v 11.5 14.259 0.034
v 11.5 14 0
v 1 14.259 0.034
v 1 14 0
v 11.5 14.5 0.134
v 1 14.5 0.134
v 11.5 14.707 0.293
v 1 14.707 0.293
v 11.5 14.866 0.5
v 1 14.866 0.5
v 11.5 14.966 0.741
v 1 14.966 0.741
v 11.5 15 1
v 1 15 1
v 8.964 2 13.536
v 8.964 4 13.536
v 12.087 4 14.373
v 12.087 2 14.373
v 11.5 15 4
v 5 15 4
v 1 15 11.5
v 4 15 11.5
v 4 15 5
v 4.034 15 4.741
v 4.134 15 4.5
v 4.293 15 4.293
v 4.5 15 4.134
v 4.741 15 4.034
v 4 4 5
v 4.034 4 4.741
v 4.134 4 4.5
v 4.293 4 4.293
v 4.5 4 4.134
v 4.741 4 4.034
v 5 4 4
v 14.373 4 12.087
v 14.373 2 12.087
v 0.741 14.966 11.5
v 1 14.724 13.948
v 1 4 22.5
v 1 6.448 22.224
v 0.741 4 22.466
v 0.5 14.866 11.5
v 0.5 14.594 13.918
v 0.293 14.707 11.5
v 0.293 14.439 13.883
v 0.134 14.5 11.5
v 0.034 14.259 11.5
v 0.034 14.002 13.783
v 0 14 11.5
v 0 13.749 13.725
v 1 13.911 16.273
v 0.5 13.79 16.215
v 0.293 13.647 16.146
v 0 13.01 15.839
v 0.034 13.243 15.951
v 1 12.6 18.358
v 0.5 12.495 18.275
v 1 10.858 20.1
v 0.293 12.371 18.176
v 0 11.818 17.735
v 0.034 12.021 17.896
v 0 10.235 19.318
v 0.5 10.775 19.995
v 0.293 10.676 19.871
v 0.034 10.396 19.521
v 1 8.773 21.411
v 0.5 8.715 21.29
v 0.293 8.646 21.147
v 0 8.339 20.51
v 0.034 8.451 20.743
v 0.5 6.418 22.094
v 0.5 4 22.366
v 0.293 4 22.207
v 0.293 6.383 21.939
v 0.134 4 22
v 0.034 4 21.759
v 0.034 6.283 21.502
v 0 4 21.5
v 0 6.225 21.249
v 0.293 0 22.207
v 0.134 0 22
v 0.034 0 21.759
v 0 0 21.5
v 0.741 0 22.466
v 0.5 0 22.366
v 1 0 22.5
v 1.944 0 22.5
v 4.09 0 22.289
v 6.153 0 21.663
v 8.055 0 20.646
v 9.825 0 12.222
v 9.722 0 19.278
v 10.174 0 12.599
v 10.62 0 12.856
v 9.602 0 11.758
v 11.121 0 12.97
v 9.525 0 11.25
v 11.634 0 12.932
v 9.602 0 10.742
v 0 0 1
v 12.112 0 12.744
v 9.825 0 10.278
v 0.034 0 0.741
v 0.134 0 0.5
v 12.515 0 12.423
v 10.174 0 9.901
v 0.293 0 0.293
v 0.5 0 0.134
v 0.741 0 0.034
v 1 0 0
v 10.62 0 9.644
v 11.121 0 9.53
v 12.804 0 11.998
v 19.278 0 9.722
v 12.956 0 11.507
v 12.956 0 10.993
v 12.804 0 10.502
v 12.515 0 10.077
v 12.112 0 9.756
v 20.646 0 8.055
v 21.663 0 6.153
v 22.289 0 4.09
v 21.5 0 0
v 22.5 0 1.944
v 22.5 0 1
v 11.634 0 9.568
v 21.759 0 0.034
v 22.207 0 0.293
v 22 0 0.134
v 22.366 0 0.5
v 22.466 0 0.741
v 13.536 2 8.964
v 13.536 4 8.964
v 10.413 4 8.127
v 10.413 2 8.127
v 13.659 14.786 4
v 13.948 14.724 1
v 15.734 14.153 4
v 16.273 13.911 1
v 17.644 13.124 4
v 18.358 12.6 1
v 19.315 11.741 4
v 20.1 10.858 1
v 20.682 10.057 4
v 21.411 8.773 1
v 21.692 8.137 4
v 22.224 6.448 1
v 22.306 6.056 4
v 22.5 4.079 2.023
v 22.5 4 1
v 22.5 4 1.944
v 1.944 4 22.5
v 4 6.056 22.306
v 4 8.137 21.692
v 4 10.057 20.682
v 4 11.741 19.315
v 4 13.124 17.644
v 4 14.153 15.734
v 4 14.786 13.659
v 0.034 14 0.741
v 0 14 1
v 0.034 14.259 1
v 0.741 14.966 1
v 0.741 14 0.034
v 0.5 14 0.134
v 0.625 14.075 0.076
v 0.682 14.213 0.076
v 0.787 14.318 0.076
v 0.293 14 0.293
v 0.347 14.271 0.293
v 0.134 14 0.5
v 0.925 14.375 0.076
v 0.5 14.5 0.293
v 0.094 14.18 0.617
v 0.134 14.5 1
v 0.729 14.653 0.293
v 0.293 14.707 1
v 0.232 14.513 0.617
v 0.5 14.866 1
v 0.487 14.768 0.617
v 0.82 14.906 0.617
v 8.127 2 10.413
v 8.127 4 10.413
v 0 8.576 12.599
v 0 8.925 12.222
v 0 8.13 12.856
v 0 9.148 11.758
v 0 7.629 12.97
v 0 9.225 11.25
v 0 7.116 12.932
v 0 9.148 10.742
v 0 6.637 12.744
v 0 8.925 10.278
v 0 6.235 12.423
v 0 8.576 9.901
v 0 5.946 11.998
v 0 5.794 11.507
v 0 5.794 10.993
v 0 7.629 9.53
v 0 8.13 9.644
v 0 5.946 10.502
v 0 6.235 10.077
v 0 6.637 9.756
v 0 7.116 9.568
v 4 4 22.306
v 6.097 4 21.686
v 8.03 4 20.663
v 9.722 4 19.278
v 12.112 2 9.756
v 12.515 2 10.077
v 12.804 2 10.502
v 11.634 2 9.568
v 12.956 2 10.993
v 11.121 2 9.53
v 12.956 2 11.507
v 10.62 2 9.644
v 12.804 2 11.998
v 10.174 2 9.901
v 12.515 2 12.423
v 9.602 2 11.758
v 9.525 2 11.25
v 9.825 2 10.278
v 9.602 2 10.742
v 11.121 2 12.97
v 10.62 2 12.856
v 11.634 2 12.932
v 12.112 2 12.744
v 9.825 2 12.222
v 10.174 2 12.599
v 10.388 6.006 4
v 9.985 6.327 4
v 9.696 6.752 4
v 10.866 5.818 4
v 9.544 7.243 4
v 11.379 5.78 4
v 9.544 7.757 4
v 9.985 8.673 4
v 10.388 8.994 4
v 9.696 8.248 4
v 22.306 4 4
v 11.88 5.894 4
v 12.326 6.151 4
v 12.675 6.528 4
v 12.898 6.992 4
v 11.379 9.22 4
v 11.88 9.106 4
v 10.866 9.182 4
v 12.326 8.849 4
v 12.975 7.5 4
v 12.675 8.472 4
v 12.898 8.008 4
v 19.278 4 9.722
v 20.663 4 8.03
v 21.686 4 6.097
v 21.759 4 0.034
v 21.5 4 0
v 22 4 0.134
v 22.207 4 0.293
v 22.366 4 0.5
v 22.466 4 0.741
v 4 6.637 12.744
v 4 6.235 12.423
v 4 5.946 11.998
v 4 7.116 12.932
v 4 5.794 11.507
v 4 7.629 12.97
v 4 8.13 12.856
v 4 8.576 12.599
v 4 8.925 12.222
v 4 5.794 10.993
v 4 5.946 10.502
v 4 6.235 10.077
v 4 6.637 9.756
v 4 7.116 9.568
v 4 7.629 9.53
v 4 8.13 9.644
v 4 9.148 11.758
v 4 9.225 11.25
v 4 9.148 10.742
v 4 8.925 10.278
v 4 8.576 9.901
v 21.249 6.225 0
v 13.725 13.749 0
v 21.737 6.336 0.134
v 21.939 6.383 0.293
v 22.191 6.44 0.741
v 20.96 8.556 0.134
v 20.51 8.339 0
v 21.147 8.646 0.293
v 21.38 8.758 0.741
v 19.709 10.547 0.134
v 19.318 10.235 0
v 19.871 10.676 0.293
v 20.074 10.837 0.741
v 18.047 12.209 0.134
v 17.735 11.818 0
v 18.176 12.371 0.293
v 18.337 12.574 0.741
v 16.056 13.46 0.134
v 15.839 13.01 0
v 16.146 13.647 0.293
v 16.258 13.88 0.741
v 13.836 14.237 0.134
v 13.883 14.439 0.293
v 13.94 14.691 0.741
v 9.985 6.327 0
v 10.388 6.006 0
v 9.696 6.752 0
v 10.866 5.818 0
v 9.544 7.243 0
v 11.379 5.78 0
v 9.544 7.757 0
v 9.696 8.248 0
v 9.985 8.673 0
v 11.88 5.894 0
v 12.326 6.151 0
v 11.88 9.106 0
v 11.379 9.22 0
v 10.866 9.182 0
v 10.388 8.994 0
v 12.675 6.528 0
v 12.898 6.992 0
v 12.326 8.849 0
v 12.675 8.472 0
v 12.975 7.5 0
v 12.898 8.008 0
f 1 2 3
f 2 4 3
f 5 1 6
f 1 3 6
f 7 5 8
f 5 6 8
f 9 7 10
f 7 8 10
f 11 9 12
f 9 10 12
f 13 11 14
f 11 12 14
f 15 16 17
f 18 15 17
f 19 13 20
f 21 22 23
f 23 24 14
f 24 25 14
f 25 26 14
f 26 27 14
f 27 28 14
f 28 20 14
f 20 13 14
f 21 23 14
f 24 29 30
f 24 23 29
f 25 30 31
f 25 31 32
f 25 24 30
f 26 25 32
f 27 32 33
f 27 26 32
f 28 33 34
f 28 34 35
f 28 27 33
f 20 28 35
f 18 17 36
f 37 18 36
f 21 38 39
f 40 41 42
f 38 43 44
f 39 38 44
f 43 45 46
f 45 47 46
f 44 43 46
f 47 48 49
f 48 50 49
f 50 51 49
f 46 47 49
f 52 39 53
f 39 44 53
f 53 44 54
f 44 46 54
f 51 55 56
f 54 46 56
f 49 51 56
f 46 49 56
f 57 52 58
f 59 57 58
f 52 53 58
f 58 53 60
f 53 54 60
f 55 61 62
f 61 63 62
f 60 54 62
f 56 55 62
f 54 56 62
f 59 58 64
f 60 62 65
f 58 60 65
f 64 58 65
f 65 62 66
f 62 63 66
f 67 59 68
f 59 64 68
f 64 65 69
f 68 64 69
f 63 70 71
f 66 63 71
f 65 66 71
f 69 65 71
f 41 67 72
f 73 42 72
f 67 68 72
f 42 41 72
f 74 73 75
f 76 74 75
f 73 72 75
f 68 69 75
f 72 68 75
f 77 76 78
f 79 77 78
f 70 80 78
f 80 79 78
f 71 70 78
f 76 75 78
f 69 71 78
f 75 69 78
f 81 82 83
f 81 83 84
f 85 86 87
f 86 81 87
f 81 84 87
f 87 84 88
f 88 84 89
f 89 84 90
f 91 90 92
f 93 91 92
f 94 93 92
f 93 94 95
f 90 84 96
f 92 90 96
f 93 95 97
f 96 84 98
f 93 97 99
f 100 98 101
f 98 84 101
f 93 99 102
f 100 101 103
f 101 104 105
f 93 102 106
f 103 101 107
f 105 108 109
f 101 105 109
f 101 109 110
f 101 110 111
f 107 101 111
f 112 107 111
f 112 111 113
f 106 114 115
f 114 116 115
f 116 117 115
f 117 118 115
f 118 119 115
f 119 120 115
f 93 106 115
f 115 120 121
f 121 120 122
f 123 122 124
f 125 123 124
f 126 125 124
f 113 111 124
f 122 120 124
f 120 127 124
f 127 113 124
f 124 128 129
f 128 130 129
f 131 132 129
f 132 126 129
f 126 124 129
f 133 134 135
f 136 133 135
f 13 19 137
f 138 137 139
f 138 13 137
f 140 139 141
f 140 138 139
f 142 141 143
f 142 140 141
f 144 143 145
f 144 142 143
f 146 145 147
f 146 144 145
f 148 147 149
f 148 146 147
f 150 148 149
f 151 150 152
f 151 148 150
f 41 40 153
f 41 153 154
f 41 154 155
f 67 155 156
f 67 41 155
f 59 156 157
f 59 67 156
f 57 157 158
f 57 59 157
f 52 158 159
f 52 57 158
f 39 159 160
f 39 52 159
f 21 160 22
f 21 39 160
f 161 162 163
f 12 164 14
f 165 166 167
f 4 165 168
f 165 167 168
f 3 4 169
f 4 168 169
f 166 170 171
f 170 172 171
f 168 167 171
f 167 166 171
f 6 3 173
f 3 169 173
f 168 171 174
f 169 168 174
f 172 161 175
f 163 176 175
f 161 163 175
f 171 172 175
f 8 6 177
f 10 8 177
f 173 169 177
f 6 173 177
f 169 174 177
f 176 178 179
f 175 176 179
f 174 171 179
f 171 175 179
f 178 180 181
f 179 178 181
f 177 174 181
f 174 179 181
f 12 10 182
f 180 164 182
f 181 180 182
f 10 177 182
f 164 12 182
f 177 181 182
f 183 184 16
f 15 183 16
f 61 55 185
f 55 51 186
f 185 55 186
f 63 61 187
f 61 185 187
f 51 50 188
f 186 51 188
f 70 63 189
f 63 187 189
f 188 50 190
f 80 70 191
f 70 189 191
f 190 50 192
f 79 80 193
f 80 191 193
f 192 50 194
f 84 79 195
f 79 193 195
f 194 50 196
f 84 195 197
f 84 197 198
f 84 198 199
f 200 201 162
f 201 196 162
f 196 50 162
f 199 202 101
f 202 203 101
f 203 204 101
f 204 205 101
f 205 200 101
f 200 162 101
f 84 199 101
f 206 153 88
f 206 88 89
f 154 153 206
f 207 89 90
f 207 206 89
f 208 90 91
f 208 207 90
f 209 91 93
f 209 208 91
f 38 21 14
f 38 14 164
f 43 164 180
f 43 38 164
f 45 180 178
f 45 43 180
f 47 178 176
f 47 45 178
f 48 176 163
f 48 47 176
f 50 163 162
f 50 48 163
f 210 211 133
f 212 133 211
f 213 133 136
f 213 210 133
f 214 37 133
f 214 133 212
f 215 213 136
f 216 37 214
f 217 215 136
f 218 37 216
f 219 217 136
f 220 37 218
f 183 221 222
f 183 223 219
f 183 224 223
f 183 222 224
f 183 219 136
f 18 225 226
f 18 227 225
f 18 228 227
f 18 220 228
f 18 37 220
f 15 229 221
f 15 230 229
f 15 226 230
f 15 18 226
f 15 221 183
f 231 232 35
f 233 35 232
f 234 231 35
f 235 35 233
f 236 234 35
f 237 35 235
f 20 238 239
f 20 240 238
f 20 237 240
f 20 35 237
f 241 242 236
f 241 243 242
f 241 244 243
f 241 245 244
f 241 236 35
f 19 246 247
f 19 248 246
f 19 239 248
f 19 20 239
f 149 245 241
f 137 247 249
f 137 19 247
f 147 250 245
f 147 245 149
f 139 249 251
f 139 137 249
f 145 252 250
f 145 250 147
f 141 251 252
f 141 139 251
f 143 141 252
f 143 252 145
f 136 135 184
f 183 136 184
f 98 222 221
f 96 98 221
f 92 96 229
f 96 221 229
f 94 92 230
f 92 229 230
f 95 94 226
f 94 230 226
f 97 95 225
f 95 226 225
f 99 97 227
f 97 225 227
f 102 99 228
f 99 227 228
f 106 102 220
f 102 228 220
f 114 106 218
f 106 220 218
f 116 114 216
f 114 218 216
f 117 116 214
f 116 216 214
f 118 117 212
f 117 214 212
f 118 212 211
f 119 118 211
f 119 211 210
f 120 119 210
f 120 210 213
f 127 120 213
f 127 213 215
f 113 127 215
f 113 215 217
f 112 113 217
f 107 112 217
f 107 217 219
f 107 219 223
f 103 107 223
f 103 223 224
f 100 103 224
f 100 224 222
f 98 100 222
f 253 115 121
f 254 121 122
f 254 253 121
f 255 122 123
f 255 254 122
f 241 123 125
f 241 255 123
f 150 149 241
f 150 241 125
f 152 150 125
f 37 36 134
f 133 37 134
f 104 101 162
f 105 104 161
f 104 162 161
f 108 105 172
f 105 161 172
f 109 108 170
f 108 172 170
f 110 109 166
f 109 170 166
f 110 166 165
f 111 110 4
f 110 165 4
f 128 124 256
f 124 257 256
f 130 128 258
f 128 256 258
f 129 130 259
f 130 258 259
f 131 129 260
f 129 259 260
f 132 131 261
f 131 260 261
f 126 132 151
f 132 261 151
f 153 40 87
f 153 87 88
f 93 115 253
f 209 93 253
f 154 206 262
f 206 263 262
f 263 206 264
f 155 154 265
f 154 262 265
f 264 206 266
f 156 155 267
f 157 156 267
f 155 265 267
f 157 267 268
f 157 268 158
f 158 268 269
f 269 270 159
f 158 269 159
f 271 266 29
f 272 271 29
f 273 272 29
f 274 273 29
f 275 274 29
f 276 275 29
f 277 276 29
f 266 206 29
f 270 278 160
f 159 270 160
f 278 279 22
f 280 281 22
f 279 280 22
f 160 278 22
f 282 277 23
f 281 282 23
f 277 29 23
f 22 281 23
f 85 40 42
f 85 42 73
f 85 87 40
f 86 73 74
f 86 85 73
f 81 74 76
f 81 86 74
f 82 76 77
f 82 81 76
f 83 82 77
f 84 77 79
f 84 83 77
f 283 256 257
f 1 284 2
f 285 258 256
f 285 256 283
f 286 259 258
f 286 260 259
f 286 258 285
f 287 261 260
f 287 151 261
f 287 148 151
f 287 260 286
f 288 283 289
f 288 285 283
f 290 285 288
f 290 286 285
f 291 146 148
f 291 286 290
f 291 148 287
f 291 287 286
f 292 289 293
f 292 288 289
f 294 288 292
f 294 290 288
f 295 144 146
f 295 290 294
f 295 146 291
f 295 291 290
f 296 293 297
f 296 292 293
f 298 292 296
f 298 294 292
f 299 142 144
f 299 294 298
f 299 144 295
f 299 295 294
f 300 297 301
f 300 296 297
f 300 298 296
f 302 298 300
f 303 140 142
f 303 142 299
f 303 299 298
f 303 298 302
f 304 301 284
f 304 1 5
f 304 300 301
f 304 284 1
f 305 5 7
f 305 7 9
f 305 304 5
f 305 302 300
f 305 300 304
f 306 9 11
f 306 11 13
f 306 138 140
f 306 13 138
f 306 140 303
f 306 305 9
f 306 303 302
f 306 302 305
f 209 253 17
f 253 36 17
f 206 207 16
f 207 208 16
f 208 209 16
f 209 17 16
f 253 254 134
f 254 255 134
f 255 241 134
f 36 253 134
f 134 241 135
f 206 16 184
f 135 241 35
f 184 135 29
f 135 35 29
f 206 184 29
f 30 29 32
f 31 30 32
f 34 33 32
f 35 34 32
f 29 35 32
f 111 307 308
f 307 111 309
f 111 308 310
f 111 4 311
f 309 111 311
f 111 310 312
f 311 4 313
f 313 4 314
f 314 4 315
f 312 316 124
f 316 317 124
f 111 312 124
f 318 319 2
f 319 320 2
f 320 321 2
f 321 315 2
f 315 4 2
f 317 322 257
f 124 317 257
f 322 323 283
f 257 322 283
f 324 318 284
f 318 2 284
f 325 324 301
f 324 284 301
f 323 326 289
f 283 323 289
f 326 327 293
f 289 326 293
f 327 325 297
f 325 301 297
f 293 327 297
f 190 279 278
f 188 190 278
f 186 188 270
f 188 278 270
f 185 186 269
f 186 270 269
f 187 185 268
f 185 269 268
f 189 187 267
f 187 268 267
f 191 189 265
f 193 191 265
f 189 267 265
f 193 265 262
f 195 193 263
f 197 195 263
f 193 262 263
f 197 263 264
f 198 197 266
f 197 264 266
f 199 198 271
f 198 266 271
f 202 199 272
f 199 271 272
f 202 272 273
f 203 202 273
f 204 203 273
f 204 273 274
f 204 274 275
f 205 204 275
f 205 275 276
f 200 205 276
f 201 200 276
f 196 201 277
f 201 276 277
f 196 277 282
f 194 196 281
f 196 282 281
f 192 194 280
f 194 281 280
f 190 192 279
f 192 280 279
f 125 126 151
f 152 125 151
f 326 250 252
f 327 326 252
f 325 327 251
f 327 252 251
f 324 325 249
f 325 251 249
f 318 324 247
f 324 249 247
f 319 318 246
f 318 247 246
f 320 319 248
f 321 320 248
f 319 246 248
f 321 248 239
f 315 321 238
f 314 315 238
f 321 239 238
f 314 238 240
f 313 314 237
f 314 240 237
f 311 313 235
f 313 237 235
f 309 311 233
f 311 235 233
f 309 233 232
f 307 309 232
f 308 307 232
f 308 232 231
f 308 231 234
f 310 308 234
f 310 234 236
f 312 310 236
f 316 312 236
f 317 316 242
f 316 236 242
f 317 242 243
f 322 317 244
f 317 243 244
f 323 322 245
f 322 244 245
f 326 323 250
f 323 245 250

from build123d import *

# Parameters (mm, degrees)
F1_W         = 22.5
F1_H         = 15
F2_DEPTH     = 4
F4_DEPTH     = 18.5
F5_R         = 1.725
F6_DEPTH     = 4
F7_R         = 1.725
F8_DEPTH     = 4
F9_R         = 1.725
F10_DEPTH    = 4
F11_DEPTH    = 2
F12_SIZE     = 16
F13_T1_DEPTH = 59
F13_T3_DEPTH = 59
F13_T5_DEPTH = 26.7817459305
F14_R        = 1


# Not quite as in the source:
# - a fillet or chamfer that OpenCascade refuses, or shapes differently, is made with other operations: its cross-section is extruded or revolved along the edge and cut away or added


with BuildPart() as f2:
    # F1 (on Top) → F2 (new body)
    with BuildSketch(Plane.XY):
        with Locations((11.25, 7.5)):
            Rectangle(F1_W, F1_H)
    extrude(amount=F2_DEPTH)

    # F3 (on face) → F4 (join)
    with BuildSketch(Plane.XY.offset(4)):
        Polygon((4, 15), (0, 15), (0, 0), (22.5, 0), (22.5, 4), (4, 4), align=None)
    extrude(amount=F4_DEPTH)

    # F5 (on face) → F6 (cut, through all)
    with BuildSketch(Plane.XY.offset(4)):
        with Locations((11.25, 7.5)):
            Circle(F5_R)
    extrude(amount=-F6_DEPTH, mode=Mode.SUBTRACT)

    # F7 (on face) → F8 (cut, through all)
    with BuildSketch(Plane.YZ.offset(4)):
        with Locations((7.5, 11.25)):
            Circle(F7_R)
    extrude(amount=-F8_DEPTH, mode=Mode.SUBTRACT)

    # F9 (on face) → F10 (cut, through all)
    with BuildSketch(Plane(origin=(0, 4, 0), x_dir=(-1, 0, 0), z_dir=(0, 1, 0))):
        with Locations((-11.25, 11.25)):
            Circle(F9_R)
    extrude(amount=-F10_DEPTH, mode=Mode.SUBTRACT)

    # F9 (on face) → F11 (cut)
    with BuildSketch(Plane(origin=(0, 4, 0), x_dir=(-1, 0, 0), z_dir=(0, 1, 0))):
        Polygon((-8.1270057994, 10.413196226), (-8.9638095734, 13.5361904266), (-12.086803774, 14.3729942006), (-14.3729942006, 12.086803774), (-13.5361904266, 8.9638095734), (-10.413196226, 8.1270057994), align=None)
        with Locations((-11.25, 11.25)):
            Circle(F9_R, mode=Mode.SUBTRACT)
    extrude(amount=-F11_DEPTH, mode=Mode.SUBTRACT)

    # F12
    f12_edges = [f2.edges().sort_by_distance(p)[0] for p in [
        (22.5, 2, 22.5),
    ]]
    chamfer(f12_edges, length=F12_SIZE)

    # F13: fillet of radius 11 on 4 edges, made by hand

    # F13_s2 → F13_t1 (cut)
    with BuildSketch(Plane.XY.offset(-27.5)):
        with BuildLine():
            ThreePointArc((11.5, 15), (19.2781745931, 11.7781745931), (22.5, 4))
            Line((22.5, 4), (22.5, 15))
            Line((22.5, 15), (11.5, 15))
        make_face()
    extrude(amount=F13_T1_DEPTH, mode=Mode.SUBTRACT)

    # F13_s4 → F13_t3 (cut)
    with BuildSketch(Plane.YZ.offset(-27.5)):
        with BuildLine():
            ThreePointArc((4, 22.5), (11.7781745931, 19.2781745931), (15, 11.5))
            Line((15, 11.5), (15, 22.5))
            Line((15, 22.5), (4, 22.5))
        make_face()
    extrude(amount=F13_T3_DEPTH, mode=Mode.SUBTRACT)

    # F13_s6 → F13_t5 (cut)
    with BuildSketch(Plane.XZ.offset(-15.3908729653)):
        with BuildLine():
            ThreePointArc((1.9436508139, 22.5), (6.1531685699, 21.6626748576), (9.7218254069, 19.2781745931))
            Line((9.7218254069, 19.2781745931), (6.5, 22.5))
            Line((6.5, 22.5), (1.9436508139, 22.5))
        make_face()
        with BuildLine():
            ThreePointArc((19.2781745931, 9.7218254069), (21.6626748576, 6.1531685699), (22.5, 1.9436508139))
            Line((22.5, 1.9436508139), (22.5, 6.5))
            Line((22.5, 6.5), (19.2781745931, 9.7218254069))
        make_face()
    extrude(amount=F13_T5_DEPTH, mode=Mode.SUBTRACT)

    # F14
    f14_edges = [f2.edges().sort_by_distance(p)[0] for p in [
        (0, 2, 22.5),
        (0, 7.5, 0),
        (22.5, 2, 0),
        (4, 9.5, 4),
        (0, 15, 5.75),
        (0, 11.778175, 19.278175),
        (5.75, 15, 0),
        (19.278175, 11.778175, 0),
    ]]
    fillet(f14_edges, radius=F14_R)


solid = f2.part
